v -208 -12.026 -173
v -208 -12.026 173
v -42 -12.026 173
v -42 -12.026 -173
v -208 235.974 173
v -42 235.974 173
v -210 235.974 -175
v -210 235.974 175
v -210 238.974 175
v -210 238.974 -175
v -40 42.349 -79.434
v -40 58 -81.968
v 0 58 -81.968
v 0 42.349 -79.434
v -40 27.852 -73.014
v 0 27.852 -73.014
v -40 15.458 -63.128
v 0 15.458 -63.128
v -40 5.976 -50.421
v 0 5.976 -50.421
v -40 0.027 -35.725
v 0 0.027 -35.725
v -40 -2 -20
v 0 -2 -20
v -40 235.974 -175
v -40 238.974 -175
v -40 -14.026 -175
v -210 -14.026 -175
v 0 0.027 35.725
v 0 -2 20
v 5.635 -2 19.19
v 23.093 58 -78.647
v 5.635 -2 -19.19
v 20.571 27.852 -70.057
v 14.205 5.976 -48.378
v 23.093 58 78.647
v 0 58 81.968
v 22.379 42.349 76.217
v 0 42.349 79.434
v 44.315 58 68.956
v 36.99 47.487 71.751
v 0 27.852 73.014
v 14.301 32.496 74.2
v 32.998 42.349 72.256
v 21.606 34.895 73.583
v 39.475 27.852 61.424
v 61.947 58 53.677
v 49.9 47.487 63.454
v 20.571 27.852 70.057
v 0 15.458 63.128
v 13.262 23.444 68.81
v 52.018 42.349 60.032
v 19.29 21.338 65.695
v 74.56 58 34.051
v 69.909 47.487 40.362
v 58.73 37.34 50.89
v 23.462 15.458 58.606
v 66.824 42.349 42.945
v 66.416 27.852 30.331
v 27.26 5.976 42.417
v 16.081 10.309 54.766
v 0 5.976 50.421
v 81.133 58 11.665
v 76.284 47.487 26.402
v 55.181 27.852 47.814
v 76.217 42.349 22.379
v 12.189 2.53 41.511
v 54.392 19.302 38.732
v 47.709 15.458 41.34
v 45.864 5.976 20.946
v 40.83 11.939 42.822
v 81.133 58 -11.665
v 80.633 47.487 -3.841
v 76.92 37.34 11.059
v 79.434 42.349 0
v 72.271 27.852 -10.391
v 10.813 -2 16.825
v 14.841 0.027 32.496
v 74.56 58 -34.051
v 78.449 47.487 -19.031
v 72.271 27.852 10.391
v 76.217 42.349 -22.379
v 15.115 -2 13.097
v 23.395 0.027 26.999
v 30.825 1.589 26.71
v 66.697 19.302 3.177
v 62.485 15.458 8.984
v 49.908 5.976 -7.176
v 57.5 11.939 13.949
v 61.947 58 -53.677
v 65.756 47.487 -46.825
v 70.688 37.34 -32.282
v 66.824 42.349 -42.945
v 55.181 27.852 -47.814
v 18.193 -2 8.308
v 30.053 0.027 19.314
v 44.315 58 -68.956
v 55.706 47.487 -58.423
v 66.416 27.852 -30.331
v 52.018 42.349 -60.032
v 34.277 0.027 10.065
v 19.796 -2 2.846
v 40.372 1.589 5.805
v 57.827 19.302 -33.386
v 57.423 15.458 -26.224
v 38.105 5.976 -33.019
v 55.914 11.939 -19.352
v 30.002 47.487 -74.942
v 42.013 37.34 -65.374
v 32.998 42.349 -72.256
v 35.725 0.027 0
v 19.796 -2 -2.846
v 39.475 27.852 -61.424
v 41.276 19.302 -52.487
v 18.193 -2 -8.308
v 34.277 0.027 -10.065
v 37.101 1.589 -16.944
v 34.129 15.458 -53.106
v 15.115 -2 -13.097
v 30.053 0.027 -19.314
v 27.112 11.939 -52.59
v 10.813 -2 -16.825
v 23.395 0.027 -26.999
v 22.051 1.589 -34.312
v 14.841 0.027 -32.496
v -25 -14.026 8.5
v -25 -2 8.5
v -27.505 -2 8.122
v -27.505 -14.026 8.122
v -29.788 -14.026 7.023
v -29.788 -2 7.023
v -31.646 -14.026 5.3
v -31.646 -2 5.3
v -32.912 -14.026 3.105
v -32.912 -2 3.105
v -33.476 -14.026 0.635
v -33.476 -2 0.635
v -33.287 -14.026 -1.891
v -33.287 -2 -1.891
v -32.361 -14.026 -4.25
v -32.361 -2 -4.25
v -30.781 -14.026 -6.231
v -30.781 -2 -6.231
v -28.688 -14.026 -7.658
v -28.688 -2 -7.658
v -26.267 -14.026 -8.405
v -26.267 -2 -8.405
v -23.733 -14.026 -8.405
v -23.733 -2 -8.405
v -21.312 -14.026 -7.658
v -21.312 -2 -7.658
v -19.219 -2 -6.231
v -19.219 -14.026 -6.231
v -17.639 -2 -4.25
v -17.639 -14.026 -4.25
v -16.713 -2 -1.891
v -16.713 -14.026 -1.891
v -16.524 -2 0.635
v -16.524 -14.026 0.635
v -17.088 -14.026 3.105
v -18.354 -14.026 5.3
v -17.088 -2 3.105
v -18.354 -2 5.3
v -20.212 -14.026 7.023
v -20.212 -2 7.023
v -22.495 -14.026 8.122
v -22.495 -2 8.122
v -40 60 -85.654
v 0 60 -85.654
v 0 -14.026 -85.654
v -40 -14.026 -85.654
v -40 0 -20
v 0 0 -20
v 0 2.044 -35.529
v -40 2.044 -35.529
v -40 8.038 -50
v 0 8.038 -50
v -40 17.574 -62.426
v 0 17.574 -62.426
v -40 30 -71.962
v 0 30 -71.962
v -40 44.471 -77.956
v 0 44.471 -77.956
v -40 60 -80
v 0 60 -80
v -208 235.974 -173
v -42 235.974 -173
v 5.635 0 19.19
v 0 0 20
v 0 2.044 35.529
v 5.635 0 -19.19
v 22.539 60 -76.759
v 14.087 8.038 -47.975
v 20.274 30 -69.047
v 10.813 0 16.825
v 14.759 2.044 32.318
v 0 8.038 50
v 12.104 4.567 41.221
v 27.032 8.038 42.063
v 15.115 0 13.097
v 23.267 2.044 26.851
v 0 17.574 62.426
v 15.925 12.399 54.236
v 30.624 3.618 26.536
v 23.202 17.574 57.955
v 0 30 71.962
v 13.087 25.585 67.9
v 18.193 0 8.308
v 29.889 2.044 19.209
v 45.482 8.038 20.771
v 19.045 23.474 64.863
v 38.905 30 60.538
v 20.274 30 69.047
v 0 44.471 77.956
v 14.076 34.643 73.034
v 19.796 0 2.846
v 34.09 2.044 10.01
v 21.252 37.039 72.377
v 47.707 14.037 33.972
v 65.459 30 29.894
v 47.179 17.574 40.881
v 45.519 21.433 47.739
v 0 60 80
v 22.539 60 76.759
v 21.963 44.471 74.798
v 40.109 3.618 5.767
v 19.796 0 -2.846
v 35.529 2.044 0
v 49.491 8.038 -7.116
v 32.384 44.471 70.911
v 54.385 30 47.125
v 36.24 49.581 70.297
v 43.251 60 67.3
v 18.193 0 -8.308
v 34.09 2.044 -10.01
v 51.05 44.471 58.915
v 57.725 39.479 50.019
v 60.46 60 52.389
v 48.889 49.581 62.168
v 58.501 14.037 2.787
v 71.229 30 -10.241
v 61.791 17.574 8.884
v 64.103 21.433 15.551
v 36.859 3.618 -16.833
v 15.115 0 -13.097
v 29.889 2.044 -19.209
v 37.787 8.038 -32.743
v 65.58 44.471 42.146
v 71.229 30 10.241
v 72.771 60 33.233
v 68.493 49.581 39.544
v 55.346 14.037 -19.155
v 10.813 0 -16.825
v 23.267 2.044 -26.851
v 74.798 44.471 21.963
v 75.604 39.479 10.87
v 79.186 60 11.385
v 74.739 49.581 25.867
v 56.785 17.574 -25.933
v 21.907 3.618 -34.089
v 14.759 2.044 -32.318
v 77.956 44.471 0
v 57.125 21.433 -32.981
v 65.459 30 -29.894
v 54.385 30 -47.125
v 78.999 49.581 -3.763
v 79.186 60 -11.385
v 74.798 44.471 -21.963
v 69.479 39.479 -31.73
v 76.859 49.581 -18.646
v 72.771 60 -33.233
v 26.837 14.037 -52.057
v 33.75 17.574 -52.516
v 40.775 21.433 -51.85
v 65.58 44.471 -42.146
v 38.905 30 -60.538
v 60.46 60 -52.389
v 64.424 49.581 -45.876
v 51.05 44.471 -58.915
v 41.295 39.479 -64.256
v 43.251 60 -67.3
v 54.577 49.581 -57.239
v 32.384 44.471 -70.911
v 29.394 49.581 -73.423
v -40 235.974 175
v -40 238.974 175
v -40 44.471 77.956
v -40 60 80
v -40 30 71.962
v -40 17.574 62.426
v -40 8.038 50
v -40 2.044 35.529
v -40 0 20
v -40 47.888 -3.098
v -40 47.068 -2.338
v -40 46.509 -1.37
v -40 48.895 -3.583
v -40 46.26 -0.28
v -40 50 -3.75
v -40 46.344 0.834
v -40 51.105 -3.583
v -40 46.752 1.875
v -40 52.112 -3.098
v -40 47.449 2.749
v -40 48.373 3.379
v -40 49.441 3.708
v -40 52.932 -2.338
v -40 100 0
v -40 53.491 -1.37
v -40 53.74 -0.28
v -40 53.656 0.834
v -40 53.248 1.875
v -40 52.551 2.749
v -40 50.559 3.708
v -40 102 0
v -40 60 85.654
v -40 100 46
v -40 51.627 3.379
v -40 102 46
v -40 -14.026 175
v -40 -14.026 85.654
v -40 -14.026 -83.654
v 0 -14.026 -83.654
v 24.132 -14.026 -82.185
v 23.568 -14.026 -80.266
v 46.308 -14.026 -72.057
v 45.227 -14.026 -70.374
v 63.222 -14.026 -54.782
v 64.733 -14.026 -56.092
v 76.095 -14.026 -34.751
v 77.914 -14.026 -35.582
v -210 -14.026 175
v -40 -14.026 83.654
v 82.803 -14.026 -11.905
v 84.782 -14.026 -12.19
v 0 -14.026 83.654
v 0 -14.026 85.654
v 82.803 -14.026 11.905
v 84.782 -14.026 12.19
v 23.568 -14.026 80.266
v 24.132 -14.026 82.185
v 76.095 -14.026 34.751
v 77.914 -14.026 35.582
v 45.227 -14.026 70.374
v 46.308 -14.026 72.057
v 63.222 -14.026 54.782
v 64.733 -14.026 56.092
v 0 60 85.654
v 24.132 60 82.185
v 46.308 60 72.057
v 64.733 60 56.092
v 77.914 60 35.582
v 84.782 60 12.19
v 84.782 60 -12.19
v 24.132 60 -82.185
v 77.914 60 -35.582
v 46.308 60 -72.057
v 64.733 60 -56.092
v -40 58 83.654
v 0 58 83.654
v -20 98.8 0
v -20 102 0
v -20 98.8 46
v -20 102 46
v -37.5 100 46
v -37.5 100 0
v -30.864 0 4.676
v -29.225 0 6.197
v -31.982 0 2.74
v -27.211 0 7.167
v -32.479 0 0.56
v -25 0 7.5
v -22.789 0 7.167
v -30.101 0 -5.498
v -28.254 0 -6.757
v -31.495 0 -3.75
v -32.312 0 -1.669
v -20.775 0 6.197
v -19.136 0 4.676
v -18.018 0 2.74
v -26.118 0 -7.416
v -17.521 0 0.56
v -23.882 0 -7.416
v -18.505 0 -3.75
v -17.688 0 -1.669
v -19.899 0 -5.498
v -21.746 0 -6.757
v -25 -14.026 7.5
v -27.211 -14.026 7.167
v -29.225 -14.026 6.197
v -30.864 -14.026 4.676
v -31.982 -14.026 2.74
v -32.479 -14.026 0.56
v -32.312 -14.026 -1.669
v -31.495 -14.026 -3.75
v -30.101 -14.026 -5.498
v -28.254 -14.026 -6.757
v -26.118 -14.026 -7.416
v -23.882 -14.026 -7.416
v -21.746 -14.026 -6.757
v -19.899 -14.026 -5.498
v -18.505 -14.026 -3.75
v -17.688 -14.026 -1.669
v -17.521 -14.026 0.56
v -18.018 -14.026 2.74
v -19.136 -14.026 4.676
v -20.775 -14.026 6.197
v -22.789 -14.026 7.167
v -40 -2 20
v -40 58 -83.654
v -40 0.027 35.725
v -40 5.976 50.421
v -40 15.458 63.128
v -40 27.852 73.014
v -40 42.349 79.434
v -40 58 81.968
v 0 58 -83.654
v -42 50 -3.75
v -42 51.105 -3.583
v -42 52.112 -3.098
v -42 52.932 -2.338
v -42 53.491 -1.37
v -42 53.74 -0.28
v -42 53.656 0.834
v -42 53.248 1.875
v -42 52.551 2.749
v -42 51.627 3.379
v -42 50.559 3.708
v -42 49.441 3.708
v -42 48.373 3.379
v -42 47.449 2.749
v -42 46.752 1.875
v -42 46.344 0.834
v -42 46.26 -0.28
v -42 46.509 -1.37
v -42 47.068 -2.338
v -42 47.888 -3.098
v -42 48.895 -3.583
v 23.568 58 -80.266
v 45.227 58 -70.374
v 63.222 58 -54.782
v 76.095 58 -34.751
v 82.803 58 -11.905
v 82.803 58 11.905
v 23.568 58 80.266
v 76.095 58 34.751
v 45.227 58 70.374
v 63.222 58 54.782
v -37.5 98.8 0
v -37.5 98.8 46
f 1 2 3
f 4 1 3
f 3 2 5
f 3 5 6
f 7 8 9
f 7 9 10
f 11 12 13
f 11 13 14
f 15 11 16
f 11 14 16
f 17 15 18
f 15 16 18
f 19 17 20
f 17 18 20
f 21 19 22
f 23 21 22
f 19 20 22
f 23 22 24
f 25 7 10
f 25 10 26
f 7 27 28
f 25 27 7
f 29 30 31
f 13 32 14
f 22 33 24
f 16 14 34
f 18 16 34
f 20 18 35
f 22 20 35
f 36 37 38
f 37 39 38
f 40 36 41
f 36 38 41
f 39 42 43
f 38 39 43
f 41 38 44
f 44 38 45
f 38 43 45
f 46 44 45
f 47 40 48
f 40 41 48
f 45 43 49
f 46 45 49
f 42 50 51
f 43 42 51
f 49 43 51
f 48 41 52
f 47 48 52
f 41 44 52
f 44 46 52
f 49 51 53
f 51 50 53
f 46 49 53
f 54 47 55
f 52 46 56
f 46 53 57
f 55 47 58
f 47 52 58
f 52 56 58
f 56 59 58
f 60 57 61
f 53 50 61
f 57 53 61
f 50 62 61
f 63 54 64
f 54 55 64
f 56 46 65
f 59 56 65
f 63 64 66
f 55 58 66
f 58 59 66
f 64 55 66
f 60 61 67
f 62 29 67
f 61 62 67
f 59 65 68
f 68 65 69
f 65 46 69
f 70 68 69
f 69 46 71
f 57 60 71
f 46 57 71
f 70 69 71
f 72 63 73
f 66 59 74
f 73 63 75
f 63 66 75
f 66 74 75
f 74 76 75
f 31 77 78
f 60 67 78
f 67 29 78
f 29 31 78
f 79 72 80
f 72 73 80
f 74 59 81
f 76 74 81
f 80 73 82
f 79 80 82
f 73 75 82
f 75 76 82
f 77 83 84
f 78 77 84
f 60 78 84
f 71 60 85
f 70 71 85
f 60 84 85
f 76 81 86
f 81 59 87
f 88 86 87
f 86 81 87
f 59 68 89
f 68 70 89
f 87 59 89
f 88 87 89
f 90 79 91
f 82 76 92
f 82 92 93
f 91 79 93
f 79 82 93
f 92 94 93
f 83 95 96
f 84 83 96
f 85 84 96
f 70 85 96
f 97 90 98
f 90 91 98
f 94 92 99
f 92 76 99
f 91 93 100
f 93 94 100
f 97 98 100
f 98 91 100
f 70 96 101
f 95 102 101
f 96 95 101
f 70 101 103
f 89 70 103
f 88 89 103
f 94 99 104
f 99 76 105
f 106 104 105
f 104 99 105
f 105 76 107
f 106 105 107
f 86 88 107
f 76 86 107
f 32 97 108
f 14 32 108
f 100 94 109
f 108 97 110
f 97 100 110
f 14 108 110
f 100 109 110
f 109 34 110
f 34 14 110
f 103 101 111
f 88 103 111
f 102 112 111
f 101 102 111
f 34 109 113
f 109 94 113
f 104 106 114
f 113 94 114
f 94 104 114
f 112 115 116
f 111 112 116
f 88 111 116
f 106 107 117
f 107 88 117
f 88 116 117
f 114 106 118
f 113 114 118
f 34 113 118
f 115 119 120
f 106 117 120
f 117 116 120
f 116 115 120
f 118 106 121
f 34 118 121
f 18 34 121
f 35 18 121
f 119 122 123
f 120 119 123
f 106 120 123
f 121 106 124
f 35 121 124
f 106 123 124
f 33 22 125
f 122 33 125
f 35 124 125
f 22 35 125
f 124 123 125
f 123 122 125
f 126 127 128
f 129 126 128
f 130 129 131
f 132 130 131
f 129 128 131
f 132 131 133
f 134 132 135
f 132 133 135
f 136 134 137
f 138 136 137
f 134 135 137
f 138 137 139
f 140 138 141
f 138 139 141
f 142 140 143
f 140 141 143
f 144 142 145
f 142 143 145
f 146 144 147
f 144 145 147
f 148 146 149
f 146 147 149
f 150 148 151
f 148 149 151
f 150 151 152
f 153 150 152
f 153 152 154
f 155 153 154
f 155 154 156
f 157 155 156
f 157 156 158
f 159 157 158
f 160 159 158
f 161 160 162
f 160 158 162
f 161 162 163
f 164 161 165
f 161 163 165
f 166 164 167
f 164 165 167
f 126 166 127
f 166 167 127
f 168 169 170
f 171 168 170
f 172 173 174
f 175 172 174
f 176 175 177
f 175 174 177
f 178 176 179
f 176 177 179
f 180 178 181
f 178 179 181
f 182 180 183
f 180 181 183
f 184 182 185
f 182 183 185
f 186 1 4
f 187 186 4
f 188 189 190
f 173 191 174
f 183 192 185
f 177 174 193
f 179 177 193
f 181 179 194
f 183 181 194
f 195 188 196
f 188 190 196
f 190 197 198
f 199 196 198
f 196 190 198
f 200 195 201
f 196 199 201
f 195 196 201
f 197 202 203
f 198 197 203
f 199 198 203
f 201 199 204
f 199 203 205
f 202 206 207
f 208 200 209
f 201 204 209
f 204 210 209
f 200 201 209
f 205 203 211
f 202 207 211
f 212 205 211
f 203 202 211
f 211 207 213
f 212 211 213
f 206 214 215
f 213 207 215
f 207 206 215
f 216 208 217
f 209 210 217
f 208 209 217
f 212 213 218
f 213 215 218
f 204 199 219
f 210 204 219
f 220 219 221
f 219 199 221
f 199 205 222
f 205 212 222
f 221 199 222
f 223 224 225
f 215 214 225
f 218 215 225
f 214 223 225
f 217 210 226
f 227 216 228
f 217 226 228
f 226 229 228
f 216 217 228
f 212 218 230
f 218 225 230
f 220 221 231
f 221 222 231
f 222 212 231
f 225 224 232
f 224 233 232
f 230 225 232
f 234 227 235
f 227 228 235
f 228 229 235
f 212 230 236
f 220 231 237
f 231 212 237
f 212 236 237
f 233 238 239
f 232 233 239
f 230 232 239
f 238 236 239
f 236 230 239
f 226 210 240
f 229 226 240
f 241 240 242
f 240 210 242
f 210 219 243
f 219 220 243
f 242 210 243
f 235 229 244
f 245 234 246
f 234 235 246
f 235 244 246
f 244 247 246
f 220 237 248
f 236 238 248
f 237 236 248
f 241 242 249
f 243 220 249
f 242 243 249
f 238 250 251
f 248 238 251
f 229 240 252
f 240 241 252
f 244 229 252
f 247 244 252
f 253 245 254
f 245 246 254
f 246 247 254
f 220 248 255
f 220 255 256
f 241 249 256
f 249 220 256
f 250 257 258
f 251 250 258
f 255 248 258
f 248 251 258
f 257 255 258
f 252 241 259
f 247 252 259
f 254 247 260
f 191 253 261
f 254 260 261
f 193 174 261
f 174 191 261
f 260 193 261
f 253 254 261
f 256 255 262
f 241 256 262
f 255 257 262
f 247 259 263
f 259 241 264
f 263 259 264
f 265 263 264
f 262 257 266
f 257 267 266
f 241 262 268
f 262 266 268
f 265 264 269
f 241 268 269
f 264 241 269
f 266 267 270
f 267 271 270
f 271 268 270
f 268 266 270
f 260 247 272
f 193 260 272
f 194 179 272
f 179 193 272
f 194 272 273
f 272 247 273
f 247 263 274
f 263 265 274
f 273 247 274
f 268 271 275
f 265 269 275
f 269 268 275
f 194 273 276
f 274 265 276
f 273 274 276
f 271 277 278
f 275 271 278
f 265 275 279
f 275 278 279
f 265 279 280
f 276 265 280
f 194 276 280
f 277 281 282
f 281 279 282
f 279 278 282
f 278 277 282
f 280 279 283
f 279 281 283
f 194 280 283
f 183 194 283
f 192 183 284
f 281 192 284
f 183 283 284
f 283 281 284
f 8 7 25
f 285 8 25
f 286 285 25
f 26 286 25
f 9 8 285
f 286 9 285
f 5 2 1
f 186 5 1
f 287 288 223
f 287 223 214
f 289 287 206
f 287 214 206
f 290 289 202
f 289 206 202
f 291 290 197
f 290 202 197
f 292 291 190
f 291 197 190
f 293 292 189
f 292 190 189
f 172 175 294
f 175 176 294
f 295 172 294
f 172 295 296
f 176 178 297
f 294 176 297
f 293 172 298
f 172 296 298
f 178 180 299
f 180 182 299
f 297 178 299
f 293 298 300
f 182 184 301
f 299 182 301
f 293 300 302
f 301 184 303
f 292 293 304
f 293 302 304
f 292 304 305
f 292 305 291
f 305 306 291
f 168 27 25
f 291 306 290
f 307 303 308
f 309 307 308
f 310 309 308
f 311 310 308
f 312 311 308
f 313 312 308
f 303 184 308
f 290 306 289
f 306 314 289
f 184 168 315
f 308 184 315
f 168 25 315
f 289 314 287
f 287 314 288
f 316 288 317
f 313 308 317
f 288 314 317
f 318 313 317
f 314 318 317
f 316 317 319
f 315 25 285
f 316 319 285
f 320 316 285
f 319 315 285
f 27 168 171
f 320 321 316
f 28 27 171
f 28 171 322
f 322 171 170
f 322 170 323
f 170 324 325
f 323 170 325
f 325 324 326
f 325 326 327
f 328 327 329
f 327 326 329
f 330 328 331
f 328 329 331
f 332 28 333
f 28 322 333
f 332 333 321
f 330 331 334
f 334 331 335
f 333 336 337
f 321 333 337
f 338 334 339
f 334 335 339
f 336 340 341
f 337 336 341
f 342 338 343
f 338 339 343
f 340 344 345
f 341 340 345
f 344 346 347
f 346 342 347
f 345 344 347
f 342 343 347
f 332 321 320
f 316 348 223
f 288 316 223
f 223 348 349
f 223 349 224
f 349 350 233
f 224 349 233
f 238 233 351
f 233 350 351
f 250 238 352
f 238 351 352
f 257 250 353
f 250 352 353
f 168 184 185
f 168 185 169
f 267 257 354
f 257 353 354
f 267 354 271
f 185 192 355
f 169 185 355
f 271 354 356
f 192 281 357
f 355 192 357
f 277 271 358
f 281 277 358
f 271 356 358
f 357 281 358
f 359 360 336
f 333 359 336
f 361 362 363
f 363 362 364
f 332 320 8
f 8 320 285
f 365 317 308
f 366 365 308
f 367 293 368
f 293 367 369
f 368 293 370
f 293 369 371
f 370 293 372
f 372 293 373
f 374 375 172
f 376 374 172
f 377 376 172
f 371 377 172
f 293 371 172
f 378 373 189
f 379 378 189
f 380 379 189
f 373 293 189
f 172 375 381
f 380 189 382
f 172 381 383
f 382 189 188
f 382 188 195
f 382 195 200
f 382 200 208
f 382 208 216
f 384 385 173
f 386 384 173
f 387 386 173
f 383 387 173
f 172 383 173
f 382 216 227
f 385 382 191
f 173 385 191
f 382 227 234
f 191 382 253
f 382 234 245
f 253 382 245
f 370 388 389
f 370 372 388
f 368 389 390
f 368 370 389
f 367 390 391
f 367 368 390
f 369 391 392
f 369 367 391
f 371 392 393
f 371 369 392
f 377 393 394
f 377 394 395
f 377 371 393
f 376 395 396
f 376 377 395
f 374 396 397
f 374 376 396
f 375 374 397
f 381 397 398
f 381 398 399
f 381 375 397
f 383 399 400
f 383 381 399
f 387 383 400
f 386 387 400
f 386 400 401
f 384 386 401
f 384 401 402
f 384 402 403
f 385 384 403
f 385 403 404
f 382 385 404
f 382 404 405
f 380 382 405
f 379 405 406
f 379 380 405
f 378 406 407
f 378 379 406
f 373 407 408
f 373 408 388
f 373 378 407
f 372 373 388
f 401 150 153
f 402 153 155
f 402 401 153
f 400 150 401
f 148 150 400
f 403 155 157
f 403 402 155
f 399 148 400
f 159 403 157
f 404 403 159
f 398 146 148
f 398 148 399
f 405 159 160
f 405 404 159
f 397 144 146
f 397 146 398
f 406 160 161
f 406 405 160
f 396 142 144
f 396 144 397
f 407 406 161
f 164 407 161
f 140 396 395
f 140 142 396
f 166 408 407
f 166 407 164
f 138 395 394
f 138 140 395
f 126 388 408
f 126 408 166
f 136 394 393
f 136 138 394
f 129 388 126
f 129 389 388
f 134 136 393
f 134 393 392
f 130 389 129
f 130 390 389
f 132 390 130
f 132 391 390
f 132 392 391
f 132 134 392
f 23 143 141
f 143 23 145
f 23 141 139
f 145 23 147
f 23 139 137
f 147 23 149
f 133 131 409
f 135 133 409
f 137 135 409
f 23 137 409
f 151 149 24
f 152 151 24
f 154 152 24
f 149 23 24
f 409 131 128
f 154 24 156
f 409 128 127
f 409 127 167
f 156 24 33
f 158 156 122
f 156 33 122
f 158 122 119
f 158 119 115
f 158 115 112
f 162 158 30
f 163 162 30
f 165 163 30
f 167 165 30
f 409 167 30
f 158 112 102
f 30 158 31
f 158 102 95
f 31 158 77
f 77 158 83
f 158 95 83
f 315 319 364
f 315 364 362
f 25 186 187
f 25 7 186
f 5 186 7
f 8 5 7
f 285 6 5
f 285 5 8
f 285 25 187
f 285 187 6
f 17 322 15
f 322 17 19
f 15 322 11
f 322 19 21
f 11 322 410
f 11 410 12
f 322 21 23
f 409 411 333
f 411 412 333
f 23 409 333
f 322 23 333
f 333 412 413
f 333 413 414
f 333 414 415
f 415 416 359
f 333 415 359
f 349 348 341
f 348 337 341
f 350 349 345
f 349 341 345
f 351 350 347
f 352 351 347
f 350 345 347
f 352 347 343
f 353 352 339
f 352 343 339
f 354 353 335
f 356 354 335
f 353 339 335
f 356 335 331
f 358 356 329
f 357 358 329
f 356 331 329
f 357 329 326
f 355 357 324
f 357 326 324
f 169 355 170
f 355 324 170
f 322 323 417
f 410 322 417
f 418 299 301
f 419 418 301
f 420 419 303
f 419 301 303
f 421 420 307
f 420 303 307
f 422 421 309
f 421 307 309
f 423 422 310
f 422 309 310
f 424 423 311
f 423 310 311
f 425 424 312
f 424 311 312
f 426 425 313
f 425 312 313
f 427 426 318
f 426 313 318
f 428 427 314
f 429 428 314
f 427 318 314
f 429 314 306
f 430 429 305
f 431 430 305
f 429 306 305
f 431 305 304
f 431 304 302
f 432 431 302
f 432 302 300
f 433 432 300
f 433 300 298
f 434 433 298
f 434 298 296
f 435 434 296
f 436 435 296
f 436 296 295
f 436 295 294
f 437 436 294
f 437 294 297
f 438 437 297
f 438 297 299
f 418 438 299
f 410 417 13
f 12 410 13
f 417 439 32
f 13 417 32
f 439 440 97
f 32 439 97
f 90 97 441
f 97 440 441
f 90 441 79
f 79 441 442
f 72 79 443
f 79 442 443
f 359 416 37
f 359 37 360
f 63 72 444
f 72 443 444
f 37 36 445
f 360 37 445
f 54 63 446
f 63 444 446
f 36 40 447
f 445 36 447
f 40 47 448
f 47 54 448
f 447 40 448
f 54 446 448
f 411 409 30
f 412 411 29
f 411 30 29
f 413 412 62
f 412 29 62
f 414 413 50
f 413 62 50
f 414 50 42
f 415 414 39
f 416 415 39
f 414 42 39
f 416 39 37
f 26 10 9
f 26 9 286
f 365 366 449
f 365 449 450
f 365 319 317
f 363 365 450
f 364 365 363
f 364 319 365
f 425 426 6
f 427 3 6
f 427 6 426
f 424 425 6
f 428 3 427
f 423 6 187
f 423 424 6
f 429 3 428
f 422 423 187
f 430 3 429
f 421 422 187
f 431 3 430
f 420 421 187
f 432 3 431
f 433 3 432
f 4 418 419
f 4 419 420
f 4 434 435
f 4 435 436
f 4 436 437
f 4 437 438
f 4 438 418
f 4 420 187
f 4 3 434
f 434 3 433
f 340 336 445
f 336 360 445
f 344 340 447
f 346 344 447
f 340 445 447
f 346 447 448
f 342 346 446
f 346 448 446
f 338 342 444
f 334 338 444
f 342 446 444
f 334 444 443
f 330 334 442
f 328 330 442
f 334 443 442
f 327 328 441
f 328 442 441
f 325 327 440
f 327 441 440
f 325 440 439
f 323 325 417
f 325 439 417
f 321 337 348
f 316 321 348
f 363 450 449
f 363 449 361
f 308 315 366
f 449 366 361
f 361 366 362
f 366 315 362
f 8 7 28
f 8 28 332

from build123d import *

# Parameters (mm, degrees)
REVOLU_O2_ANGLE           = 180
RESSALTO_EXTRUS_O1_DEPTH  = 40
ESBO_O3_W                 = 350
ESBO_O3_H                 = 250
RESSALTO_EXTRUS_O2_DEPTH  = 170
CASCA2_START              = -12.026151047
CASCA2_OUTLINE_W          = 166
CASCA2_OUTLINE_H          = 346
CASCA2_DEPTH              = 248
ESBO_O4_R                 = 7.5
CORTE_EXTRUS_O1_DEPTH     = 170
ESBO_O5_R                 = 8.5
ESBO_O5_R_2               = 7.5
RESSALTO_EXTRUS_O3_DEPTH  = 12.026151047
CORTE_EXTRUS_O3_REACH     = 341.424
ESBO_O6_R                 = 3.75
ESBO_O10_W                = 170
ESBO_O10_H                = 350
RESSALTO_EXTRUS_O13_DEPTH = 3
ESBO_O11_W                = 46
ESBO_O11_H                = 2
RESSALTO_EXTRUS_O15_DEPTH = 20
ESBO_O12_W                = 17.5
ESBO_O12_H                = 46
RESSALTO_EXTRUS_O17_DEPTH = 1.2


# Read off the part's stored shape, not the designer's step: Casca2
with BuildPart() as part:
    # Esboço1 → Revolução2 (revolve)
    with BuildSketch(Plane(origin=(0, 0, 0), x_dir=(0, 0, -1), z_dir=(1, 0, 0))):
        with BuildLine():
            Line((0, 0), (-20, 0))
            ThreePointArc((-20, 0), (-62.426406871, 17.573593129), (-80, 60))
            Line((-80, 60), (-85.654168524, 60))
            Line((-85.654168524, 60), (-85.654168524, -14.026151047))
            Line((-85.654168524, -14.026151047), (-83.654168524, -14.026151047))
            Line((-83.654168524, -14.026151047), (-83.654168524, 58))
            Line((-83.654168524, 58), (-81.967733539, 58))
            ThreePointArc((-81.967733539, 58), (-63.127717306, 15.457885097), (-20, -2))
            Line((-20, -2), (-2, -2))
            Line((-2, -2), (0, -2))
            Line((0, -2), (0, 0))
        make_face()
    revolve(axis=Axis((0, -14.026151047, 0), (0, 1, 0)), revolution_arc=REVOLU_O2_ANGLE)

    # Esboço2 → Ressalto-extrusão1 (add)
    with BuildSketch(Plane.ZY):
        with BuildLine():
            Line((-20, -2), (20, -2))
            ThreePointArc((20, -2), (63.127717306, 15.457885097), (81.967733539, 58))
            Line((81.967733539, 58), (83.654168524, 58))
            Line((83.654168524, 58), (83.654168524, -14.026151047))
            Line((83.654168524, -14.026151047), (85.654168524, -14.026151047))
            Line((85.654168524, -14.026151047), (85.654168524, 60))
            Line((85.654168524, 60), (80, 60))
            ThreePointArc((80, 60), (62.426406871, 17.573593129), (20, 0))
            Line((20, 0), (-20, 0))
            ThreePointArc((-20, 0), (-62.426406871, 17.573593129), (-80, 60))
            Line((-80, 60), (-85.654168524, 60))
            Line((-85.654168524, 60), (-85.654168524, -14.026151047))
            Line((-85.654168524, -14.026151047), (-83.654168524, -14.026151047))
            Line((-83.654168524, -14.026151047), (-83.654168524, 58))
            Line((-83.654168524, 58), (-81.967733539, 58))
            ThreePointArc((-81.967733539, 58), (-63.127717306, 15.457885097), (-20, -2))
        make_face()
    extrude(amount=RESSALTO_EXTRUS_O1_DEPTH)

    # Esboço3 → Ressalto-extrusão2 (add)
    with BuildSketch(Plane.ZY.offset(40)):
        with Locations((0, 110.973848953)):
            Rectangle(ESBO_O3_W, ESBO_O3_H)
    extrude(amount=RESSALTO_EXTRUS_O2_DEPTH)

    # Casca2 outline → Casca2 (cut)
    with BuildSketch(Plane(origin=(0, 0, 0), x_dir=(1, 0, 0), z_dir=(0, 1, 0)).offset(CASCA2_START)):
        with Locations((-125, 0)):
            Rectangle(CASCA2_OUTLINE_W, CASCA2_OUTLINE_H)
    extrude(amount=CASCA2_DEPTH, mode=Mode.SUBTRACT)

    # Esboço4 → Corte-extrusão1 (cut)
    with BuildSketch(Plane(origin=(0, 0, 0), x_dir=(1, 0, 0), z_dir=(0, 1, 0))):
        with Locations(Location((-25, 0, 0), (0, 0, 270))):
            Circle(ESBO_O4_R)
    extrude(amount=-CORTE_EXTRUS_O1_DEPTH, mode=Mode.SUBTRACT)

    # Esboço5 → Ressalto-extrusão3 (add)
    with BuildSketch(Plane.XZ.offset(2)):
        with Locations(Location((-25, 0, 0), (0, 0, 90))):
            Circle(ESBO_O5_R)
        with Locations(Location((-25, 0, 0), (0, 0, 90))):
            Circle(ESBO_O5_R_2, mode=Mode.SUBTRACT)
    extrude(amount=RESSALTO_EXTRUS_O3_DEPTH)

    # Esboço6 → Corte-extrusão3 (cut, up to next)
    with BuildSketch(Plane(origin=(-40, 0, 0), x_dir=(0, 0, -1), z_dir=(1, 0, 0)), mode=Mode.PRIVATE) as corte_extrus_o3_sk1:
        with Locations((0, 50)):
            Circle(ESBO_O6_R)
    corte_extrus_o3_tool1 = extrude(corte_extrus_o3_sk1.sketch, amount=-CORTE_EXTRUS_O3_REACH, mode=Mode.PRIVATE) & part.part
    add(corte_extrus_o3_tool1.solids().sort_by_distance((-40, 50, 0))[0], mode=Mode.SUBTRACT)

    # Esboço11 → Ressalto-extrusão15 (add)
    with BuildSketch(Plane(origin=(-40, 0, 0), x_dir=(0, 0, -1), z_dir=(1, 0, 0))):
        with Locations((-23, 101)):
            Rectangle(ESBO_O11_W, ESBO_O11_H)
    extrude(amount=RESSALTO_EXTRUS_O15_DEPTH)

    # Esboço12 → Ressalto-extrusão17 (add)
    with BuildSketch(Plane.XZ.offset(-100)):
        with Locations((-28.75, 23)):
            Rectangle(ESBO_O12_W, ESBO_O12_H)
    extrude(amount=RESSALTO_EXTRUS_O17_DEPTH)


with BuildPart() as body_2:
    # Esboço10 → Ressalto-extrusão13 (new body)
    with BuildSketch(Plane(origin=(0, 235.973848953, 0), x_dir=(1, 0, 0), z_dir=(0, 1, 0))):
        with Locations((-125, 0)):
            Rectangle(ESBO_O10_W, ESBO_O10_H)
    extrude(amount=RESSALTO_EXTRUS_O13_DEPTH)


solid = Compound([part.part, body_2.part])
